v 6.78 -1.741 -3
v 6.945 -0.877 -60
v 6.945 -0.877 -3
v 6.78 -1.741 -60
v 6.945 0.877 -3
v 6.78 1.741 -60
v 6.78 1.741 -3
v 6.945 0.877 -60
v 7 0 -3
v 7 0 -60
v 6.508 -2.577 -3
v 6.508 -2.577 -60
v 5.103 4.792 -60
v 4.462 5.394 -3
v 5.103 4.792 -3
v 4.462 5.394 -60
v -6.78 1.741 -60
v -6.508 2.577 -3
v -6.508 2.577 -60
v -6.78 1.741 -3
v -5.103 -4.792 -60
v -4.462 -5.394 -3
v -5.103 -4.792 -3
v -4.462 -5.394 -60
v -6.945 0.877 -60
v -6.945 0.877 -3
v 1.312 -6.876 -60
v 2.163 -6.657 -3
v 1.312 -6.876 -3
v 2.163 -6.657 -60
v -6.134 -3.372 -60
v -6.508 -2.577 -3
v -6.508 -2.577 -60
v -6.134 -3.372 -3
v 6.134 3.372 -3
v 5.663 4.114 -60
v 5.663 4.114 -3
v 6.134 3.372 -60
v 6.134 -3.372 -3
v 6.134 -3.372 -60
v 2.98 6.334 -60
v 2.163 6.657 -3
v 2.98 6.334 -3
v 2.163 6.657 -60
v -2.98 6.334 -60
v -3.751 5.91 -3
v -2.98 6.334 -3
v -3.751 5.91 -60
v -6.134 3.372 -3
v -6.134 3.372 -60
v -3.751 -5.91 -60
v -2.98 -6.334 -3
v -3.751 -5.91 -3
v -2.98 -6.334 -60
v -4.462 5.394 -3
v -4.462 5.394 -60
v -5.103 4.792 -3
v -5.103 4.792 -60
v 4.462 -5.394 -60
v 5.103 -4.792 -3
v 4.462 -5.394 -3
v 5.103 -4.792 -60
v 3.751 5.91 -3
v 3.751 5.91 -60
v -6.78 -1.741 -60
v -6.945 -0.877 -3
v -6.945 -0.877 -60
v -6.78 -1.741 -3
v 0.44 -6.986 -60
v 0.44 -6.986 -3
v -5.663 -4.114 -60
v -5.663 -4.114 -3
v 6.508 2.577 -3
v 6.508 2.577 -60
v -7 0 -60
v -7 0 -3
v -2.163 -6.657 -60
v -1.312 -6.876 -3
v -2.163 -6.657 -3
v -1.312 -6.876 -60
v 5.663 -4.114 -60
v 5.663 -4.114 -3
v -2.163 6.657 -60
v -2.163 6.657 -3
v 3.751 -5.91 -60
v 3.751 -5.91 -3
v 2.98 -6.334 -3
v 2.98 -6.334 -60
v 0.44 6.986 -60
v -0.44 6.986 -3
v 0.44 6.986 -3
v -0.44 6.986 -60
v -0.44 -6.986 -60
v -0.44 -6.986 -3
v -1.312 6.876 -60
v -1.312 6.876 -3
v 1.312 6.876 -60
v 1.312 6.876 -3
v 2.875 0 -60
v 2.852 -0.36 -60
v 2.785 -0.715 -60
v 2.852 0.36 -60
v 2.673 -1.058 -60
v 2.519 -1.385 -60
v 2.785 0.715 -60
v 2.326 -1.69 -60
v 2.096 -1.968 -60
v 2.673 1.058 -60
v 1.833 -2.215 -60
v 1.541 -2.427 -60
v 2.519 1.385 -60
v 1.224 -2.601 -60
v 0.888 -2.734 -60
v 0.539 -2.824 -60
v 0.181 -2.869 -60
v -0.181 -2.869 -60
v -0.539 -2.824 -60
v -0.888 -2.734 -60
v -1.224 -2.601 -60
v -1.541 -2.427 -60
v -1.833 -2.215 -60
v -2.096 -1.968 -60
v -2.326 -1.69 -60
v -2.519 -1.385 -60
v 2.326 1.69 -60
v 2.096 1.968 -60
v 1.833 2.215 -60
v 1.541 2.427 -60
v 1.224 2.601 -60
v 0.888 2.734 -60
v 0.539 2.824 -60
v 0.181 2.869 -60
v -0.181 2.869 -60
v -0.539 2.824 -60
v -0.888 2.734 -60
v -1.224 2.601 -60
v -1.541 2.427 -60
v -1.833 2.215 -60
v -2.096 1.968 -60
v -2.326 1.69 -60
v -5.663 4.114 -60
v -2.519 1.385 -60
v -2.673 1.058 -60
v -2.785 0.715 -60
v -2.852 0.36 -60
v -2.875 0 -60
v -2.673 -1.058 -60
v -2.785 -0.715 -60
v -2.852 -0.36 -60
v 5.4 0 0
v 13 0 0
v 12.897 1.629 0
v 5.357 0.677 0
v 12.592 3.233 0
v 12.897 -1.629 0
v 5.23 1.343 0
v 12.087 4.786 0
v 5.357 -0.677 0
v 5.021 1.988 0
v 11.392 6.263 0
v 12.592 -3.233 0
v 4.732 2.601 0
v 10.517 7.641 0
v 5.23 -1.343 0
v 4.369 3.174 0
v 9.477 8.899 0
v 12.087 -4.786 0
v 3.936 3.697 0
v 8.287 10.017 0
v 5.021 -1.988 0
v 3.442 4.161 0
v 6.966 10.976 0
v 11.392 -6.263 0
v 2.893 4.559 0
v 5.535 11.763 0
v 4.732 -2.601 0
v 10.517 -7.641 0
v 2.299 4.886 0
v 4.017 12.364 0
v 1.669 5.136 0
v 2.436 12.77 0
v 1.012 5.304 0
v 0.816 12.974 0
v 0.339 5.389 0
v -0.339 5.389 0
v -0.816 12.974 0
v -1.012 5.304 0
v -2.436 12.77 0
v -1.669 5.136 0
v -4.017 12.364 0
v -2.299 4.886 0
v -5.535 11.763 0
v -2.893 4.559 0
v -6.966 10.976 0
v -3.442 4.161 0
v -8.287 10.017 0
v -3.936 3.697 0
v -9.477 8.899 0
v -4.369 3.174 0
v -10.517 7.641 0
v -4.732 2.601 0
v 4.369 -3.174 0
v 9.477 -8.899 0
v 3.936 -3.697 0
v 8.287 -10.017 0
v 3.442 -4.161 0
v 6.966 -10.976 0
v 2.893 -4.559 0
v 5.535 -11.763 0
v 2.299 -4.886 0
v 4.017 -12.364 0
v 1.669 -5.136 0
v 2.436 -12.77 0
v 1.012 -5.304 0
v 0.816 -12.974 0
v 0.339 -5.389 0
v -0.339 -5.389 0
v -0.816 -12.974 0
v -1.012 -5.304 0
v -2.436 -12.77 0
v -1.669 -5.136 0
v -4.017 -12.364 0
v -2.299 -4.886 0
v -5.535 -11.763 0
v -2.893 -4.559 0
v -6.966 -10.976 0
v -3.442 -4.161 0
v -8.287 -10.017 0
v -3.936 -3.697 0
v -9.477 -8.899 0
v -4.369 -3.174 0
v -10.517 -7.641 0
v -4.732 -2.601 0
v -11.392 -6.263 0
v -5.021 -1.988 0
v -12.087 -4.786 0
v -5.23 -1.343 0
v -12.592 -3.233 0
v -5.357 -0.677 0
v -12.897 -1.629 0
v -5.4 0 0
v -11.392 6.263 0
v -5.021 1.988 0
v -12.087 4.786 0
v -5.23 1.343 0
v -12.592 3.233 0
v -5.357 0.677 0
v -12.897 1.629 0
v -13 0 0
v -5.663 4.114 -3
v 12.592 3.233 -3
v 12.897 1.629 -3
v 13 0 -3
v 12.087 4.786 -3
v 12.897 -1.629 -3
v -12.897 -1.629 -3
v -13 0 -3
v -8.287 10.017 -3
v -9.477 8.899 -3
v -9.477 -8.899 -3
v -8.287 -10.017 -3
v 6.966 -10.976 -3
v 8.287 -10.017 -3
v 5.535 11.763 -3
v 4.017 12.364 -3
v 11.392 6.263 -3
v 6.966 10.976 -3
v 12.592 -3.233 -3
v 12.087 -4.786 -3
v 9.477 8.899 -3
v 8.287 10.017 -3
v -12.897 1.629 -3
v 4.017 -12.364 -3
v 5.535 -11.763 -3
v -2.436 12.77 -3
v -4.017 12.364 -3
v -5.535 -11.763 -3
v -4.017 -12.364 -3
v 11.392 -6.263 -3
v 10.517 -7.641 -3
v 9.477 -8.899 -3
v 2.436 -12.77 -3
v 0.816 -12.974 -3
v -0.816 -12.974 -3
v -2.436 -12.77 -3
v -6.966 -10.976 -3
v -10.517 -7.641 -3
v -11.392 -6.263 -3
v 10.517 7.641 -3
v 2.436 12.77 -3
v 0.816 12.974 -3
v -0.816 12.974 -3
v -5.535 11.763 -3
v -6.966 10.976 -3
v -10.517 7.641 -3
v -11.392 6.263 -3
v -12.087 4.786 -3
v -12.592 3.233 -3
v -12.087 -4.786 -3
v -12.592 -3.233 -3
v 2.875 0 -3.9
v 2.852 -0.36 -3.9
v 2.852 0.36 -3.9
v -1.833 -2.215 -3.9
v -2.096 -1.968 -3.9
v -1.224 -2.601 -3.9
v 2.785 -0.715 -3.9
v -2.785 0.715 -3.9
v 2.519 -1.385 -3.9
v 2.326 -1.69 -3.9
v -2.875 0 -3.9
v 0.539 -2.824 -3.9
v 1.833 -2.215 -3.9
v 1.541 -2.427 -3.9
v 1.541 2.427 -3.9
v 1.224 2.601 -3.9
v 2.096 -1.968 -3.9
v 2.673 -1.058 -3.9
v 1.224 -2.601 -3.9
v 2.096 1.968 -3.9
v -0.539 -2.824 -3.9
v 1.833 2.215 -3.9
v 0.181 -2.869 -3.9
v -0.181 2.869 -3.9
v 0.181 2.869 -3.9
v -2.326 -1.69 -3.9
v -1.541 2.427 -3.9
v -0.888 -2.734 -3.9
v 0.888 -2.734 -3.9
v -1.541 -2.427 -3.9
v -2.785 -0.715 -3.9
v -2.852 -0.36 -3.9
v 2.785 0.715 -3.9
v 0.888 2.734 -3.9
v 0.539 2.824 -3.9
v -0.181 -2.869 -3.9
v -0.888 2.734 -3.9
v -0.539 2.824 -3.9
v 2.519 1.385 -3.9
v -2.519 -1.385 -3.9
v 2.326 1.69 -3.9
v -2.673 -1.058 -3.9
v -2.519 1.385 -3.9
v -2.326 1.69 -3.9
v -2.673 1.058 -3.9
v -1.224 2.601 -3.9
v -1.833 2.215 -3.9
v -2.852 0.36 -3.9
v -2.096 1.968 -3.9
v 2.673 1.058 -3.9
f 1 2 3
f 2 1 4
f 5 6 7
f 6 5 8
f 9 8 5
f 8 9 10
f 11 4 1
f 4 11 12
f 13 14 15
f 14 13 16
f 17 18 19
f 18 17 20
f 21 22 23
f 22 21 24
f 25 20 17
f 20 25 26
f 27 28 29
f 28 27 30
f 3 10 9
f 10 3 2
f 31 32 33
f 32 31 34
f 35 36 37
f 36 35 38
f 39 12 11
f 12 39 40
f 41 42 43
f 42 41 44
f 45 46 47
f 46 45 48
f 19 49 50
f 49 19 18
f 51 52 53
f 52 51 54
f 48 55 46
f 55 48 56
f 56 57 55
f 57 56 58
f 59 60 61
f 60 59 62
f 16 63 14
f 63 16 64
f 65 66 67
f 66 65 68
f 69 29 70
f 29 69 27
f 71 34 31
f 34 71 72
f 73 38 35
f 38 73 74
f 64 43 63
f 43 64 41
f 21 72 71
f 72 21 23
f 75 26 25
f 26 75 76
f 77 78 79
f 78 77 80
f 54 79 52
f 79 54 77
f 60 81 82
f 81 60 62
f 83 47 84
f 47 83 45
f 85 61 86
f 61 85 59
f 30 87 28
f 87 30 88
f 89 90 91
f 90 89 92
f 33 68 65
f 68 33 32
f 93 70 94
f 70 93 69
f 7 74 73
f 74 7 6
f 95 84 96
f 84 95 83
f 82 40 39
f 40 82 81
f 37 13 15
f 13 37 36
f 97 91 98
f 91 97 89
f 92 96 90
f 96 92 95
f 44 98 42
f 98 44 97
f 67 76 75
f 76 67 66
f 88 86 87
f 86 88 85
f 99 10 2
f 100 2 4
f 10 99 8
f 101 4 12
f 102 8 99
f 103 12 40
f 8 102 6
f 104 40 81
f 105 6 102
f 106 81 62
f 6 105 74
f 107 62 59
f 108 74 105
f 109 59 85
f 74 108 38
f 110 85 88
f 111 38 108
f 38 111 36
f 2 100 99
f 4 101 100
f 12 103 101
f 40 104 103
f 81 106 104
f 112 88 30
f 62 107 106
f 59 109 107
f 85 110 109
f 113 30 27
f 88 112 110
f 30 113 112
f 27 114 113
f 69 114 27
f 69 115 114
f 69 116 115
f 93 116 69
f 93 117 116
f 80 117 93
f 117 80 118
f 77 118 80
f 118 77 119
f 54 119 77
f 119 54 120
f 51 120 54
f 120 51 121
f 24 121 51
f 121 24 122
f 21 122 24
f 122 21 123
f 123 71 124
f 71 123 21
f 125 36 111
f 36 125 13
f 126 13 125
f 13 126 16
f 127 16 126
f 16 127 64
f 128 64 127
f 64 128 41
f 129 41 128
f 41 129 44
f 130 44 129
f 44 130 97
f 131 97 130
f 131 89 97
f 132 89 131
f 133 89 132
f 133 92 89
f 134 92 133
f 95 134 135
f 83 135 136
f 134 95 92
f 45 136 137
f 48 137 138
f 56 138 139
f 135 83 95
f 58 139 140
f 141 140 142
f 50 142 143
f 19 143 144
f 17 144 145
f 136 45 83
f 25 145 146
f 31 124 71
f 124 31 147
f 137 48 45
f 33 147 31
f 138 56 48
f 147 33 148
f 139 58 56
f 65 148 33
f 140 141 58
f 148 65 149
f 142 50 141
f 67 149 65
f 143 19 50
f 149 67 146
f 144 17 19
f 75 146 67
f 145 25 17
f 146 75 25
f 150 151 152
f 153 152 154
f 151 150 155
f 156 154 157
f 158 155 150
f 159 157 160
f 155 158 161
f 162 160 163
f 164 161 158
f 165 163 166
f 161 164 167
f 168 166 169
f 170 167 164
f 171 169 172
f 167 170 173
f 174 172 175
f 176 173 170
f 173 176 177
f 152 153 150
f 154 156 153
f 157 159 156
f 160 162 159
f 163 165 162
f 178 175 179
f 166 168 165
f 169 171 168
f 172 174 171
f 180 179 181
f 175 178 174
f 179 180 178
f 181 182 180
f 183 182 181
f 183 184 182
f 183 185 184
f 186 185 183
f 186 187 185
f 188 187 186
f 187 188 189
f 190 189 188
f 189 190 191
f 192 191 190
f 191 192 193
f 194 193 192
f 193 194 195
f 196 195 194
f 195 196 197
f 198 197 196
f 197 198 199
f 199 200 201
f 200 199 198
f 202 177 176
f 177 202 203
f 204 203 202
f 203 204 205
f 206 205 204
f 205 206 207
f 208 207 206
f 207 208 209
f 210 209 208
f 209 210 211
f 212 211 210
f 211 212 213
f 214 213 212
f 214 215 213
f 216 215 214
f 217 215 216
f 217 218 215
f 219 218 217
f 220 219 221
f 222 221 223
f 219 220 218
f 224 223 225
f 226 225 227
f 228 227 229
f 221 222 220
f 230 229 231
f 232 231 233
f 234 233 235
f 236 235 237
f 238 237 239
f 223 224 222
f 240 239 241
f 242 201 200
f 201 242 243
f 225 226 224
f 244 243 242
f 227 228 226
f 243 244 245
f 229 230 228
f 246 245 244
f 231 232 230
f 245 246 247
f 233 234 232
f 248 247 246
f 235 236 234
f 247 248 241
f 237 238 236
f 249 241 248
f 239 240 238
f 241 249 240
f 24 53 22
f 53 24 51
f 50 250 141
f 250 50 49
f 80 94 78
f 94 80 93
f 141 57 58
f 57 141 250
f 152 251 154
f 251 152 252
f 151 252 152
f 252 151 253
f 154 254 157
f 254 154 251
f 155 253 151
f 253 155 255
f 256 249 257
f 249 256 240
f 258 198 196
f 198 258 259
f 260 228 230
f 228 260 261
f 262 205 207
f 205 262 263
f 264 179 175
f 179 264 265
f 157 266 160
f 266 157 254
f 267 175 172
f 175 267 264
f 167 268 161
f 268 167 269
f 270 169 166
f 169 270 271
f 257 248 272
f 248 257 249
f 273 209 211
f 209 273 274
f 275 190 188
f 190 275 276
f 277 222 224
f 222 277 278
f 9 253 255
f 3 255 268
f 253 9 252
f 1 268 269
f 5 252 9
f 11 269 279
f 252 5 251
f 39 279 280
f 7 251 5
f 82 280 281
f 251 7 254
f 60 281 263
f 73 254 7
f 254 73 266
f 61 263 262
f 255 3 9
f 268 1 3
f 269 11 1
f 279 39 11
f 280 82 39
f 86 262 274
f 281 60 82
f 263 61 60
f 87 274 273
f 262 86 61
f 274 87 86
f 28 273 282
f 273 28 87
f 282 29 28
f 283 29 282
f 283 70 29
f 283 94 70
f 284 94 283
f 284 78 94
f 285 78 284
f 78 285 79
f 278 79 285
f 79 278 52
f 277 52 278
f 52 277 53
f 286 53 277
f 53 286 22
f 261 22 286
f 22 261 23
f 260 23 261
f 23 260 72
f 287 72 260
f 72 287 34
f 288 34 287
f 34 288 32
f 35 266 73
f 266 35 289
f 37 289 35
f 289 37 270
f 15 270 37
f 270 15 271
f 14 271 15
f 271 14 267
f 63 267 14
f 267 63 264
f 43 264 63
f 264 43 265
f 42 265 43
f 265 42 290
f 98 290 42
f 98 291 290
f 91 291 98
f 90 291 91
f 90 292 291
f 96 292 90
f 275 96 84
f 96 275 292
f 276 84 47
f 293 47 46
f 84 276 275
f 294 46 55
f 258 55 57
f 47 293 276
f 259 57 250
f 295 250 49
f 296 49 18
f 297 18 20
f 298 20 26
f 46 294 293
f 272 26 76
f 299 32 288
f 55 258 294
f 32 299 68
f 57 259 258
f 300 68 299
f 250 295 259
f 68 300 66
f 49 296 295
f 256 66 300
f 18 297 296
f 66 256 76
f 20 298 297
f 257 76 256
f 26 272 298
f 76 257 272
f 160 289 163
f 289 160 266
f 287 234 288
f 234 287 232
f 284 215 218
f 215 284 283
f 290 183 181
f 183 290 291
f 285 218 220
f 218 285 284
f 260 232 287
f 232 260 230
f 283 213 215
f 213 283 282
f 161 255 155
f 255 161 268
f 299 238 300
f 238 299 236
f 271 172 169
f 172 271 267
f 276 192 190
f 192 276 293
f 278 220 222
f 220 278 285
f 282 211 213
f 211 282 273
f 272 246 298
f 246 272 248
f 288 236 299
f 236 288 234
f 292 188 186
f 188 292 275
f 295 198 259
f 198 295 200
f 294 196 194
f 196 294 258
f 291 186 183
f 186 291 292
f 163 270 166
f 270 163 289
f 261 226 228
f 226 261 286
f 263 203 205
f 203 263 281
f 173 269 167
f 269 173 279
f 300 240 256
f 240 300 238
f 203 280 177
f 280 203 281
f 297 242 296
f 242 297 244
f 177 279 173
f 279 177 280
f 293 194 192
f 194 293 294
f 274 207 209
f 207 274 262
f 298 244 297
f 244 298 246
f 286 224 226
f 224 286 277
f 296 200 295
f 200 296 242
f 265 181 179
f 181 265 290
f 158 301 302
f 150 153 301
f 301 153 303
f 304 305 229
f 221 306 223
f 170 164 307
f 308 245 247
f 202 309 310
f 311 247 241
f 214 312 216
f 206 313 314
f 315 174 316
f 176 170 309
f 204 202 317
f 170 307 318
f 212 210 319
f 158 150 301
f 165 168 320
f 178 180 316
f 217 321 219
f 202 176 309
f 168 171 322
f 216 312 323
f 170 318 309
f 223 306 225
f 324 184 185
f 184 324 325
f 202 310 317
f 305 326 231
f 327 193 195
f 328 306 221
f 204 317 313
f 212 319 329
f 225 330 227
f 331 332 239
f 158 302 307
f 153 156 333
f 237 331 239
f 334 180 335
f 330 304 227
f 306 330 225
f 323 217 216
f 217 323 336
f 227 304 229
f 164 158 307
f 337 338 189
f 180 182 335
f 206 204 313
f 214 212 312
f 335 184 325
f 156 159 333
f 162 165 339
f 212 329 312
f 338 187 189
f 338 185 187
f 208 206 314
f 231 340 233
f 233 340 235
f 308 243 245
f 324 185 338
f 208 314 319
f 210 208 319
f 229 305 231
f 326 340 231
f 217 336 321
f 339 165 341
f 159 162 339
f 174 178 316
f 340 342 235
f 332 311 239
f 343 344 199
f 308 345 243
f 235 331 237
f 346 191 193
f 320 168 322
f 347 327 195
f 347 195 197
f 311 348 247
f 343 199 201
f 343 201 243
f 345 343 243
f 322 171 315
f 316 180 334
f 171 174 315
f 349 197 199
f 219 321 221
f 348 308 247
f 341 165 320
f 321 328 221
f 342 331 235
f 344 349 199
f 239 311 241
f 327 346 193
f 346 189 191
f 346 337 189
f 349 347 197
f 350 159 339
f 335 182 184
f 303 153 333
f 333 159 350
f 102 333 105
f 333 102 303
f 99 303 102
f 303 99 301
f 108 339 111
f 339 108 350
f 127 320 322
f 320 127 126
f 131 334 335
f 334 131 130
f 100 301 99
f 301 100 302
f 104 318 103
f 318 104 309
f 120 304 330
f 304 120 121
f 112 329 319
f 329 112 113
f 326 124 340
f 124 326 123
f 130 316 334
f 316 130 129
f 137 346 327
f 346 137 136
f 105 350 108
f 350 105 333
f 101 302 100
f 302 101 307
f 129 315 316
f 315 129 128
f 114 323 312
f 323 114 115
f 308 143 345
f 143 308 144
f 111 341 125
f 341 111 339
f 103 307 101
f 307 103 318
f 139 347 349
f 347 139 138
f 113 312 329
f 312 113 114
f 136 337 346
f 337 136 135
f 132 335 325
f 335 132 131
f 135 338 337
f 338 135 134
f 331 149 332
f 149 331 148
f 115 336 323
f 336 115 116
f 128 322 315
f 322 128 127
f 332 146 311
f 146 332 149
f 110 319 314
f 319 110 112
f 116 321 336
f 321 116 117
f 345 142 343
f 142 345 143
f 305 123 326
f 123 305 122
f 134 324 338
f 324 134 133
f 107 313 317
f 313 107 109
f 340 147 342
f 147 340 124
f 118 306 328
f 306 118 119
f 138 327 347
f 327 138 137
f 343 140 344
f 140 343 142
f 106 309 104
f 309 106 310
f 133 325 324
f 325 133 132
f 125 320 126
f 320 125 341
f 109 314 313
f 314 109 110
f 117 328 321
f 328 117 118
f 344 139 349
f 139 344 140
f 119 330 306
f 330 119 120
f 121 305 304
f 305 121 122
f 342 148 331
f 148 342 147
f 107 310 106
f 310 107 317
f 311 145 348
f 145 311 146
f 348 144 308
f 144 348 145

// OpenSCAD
$fn = 50;


difference() {
	union() {
		translate(v = [0, 0, -60.0000000000]) {
			cylinder(h = 60, r = 7.0000000000);
		}
		translate(v = [0, 0, -3.0000000000]) {
			cylinder(h = 3, r = 13.0000000000);
		}
	}
	union() {
		translate(v = [0, 0, 0]) {
			rotate(a = [0, 0, 0]) {
				difference() {
					union() {
						#translate(v = [0, 0, -60.0000000000]) {
							cylinder(h = 60, r = 2.6000000000);
						}
						#translate(v = [0, 0, -3.9000000000]) {
							cylinder(h = 3.9000000000, r1 = 2.8750000000, r2 = 5.4000000000);
						}
						#translate(v = [0, 0, -60.0000000000]) {
							cylinder(h = 60, r = 2.8750000000);
						}
						#translate(v = [0, 0, -60.0000000000]) {
							cylinder(h = 60, r = 2.6000000000);
						}
					}
					union();
				}
			}
		}
	}
}
